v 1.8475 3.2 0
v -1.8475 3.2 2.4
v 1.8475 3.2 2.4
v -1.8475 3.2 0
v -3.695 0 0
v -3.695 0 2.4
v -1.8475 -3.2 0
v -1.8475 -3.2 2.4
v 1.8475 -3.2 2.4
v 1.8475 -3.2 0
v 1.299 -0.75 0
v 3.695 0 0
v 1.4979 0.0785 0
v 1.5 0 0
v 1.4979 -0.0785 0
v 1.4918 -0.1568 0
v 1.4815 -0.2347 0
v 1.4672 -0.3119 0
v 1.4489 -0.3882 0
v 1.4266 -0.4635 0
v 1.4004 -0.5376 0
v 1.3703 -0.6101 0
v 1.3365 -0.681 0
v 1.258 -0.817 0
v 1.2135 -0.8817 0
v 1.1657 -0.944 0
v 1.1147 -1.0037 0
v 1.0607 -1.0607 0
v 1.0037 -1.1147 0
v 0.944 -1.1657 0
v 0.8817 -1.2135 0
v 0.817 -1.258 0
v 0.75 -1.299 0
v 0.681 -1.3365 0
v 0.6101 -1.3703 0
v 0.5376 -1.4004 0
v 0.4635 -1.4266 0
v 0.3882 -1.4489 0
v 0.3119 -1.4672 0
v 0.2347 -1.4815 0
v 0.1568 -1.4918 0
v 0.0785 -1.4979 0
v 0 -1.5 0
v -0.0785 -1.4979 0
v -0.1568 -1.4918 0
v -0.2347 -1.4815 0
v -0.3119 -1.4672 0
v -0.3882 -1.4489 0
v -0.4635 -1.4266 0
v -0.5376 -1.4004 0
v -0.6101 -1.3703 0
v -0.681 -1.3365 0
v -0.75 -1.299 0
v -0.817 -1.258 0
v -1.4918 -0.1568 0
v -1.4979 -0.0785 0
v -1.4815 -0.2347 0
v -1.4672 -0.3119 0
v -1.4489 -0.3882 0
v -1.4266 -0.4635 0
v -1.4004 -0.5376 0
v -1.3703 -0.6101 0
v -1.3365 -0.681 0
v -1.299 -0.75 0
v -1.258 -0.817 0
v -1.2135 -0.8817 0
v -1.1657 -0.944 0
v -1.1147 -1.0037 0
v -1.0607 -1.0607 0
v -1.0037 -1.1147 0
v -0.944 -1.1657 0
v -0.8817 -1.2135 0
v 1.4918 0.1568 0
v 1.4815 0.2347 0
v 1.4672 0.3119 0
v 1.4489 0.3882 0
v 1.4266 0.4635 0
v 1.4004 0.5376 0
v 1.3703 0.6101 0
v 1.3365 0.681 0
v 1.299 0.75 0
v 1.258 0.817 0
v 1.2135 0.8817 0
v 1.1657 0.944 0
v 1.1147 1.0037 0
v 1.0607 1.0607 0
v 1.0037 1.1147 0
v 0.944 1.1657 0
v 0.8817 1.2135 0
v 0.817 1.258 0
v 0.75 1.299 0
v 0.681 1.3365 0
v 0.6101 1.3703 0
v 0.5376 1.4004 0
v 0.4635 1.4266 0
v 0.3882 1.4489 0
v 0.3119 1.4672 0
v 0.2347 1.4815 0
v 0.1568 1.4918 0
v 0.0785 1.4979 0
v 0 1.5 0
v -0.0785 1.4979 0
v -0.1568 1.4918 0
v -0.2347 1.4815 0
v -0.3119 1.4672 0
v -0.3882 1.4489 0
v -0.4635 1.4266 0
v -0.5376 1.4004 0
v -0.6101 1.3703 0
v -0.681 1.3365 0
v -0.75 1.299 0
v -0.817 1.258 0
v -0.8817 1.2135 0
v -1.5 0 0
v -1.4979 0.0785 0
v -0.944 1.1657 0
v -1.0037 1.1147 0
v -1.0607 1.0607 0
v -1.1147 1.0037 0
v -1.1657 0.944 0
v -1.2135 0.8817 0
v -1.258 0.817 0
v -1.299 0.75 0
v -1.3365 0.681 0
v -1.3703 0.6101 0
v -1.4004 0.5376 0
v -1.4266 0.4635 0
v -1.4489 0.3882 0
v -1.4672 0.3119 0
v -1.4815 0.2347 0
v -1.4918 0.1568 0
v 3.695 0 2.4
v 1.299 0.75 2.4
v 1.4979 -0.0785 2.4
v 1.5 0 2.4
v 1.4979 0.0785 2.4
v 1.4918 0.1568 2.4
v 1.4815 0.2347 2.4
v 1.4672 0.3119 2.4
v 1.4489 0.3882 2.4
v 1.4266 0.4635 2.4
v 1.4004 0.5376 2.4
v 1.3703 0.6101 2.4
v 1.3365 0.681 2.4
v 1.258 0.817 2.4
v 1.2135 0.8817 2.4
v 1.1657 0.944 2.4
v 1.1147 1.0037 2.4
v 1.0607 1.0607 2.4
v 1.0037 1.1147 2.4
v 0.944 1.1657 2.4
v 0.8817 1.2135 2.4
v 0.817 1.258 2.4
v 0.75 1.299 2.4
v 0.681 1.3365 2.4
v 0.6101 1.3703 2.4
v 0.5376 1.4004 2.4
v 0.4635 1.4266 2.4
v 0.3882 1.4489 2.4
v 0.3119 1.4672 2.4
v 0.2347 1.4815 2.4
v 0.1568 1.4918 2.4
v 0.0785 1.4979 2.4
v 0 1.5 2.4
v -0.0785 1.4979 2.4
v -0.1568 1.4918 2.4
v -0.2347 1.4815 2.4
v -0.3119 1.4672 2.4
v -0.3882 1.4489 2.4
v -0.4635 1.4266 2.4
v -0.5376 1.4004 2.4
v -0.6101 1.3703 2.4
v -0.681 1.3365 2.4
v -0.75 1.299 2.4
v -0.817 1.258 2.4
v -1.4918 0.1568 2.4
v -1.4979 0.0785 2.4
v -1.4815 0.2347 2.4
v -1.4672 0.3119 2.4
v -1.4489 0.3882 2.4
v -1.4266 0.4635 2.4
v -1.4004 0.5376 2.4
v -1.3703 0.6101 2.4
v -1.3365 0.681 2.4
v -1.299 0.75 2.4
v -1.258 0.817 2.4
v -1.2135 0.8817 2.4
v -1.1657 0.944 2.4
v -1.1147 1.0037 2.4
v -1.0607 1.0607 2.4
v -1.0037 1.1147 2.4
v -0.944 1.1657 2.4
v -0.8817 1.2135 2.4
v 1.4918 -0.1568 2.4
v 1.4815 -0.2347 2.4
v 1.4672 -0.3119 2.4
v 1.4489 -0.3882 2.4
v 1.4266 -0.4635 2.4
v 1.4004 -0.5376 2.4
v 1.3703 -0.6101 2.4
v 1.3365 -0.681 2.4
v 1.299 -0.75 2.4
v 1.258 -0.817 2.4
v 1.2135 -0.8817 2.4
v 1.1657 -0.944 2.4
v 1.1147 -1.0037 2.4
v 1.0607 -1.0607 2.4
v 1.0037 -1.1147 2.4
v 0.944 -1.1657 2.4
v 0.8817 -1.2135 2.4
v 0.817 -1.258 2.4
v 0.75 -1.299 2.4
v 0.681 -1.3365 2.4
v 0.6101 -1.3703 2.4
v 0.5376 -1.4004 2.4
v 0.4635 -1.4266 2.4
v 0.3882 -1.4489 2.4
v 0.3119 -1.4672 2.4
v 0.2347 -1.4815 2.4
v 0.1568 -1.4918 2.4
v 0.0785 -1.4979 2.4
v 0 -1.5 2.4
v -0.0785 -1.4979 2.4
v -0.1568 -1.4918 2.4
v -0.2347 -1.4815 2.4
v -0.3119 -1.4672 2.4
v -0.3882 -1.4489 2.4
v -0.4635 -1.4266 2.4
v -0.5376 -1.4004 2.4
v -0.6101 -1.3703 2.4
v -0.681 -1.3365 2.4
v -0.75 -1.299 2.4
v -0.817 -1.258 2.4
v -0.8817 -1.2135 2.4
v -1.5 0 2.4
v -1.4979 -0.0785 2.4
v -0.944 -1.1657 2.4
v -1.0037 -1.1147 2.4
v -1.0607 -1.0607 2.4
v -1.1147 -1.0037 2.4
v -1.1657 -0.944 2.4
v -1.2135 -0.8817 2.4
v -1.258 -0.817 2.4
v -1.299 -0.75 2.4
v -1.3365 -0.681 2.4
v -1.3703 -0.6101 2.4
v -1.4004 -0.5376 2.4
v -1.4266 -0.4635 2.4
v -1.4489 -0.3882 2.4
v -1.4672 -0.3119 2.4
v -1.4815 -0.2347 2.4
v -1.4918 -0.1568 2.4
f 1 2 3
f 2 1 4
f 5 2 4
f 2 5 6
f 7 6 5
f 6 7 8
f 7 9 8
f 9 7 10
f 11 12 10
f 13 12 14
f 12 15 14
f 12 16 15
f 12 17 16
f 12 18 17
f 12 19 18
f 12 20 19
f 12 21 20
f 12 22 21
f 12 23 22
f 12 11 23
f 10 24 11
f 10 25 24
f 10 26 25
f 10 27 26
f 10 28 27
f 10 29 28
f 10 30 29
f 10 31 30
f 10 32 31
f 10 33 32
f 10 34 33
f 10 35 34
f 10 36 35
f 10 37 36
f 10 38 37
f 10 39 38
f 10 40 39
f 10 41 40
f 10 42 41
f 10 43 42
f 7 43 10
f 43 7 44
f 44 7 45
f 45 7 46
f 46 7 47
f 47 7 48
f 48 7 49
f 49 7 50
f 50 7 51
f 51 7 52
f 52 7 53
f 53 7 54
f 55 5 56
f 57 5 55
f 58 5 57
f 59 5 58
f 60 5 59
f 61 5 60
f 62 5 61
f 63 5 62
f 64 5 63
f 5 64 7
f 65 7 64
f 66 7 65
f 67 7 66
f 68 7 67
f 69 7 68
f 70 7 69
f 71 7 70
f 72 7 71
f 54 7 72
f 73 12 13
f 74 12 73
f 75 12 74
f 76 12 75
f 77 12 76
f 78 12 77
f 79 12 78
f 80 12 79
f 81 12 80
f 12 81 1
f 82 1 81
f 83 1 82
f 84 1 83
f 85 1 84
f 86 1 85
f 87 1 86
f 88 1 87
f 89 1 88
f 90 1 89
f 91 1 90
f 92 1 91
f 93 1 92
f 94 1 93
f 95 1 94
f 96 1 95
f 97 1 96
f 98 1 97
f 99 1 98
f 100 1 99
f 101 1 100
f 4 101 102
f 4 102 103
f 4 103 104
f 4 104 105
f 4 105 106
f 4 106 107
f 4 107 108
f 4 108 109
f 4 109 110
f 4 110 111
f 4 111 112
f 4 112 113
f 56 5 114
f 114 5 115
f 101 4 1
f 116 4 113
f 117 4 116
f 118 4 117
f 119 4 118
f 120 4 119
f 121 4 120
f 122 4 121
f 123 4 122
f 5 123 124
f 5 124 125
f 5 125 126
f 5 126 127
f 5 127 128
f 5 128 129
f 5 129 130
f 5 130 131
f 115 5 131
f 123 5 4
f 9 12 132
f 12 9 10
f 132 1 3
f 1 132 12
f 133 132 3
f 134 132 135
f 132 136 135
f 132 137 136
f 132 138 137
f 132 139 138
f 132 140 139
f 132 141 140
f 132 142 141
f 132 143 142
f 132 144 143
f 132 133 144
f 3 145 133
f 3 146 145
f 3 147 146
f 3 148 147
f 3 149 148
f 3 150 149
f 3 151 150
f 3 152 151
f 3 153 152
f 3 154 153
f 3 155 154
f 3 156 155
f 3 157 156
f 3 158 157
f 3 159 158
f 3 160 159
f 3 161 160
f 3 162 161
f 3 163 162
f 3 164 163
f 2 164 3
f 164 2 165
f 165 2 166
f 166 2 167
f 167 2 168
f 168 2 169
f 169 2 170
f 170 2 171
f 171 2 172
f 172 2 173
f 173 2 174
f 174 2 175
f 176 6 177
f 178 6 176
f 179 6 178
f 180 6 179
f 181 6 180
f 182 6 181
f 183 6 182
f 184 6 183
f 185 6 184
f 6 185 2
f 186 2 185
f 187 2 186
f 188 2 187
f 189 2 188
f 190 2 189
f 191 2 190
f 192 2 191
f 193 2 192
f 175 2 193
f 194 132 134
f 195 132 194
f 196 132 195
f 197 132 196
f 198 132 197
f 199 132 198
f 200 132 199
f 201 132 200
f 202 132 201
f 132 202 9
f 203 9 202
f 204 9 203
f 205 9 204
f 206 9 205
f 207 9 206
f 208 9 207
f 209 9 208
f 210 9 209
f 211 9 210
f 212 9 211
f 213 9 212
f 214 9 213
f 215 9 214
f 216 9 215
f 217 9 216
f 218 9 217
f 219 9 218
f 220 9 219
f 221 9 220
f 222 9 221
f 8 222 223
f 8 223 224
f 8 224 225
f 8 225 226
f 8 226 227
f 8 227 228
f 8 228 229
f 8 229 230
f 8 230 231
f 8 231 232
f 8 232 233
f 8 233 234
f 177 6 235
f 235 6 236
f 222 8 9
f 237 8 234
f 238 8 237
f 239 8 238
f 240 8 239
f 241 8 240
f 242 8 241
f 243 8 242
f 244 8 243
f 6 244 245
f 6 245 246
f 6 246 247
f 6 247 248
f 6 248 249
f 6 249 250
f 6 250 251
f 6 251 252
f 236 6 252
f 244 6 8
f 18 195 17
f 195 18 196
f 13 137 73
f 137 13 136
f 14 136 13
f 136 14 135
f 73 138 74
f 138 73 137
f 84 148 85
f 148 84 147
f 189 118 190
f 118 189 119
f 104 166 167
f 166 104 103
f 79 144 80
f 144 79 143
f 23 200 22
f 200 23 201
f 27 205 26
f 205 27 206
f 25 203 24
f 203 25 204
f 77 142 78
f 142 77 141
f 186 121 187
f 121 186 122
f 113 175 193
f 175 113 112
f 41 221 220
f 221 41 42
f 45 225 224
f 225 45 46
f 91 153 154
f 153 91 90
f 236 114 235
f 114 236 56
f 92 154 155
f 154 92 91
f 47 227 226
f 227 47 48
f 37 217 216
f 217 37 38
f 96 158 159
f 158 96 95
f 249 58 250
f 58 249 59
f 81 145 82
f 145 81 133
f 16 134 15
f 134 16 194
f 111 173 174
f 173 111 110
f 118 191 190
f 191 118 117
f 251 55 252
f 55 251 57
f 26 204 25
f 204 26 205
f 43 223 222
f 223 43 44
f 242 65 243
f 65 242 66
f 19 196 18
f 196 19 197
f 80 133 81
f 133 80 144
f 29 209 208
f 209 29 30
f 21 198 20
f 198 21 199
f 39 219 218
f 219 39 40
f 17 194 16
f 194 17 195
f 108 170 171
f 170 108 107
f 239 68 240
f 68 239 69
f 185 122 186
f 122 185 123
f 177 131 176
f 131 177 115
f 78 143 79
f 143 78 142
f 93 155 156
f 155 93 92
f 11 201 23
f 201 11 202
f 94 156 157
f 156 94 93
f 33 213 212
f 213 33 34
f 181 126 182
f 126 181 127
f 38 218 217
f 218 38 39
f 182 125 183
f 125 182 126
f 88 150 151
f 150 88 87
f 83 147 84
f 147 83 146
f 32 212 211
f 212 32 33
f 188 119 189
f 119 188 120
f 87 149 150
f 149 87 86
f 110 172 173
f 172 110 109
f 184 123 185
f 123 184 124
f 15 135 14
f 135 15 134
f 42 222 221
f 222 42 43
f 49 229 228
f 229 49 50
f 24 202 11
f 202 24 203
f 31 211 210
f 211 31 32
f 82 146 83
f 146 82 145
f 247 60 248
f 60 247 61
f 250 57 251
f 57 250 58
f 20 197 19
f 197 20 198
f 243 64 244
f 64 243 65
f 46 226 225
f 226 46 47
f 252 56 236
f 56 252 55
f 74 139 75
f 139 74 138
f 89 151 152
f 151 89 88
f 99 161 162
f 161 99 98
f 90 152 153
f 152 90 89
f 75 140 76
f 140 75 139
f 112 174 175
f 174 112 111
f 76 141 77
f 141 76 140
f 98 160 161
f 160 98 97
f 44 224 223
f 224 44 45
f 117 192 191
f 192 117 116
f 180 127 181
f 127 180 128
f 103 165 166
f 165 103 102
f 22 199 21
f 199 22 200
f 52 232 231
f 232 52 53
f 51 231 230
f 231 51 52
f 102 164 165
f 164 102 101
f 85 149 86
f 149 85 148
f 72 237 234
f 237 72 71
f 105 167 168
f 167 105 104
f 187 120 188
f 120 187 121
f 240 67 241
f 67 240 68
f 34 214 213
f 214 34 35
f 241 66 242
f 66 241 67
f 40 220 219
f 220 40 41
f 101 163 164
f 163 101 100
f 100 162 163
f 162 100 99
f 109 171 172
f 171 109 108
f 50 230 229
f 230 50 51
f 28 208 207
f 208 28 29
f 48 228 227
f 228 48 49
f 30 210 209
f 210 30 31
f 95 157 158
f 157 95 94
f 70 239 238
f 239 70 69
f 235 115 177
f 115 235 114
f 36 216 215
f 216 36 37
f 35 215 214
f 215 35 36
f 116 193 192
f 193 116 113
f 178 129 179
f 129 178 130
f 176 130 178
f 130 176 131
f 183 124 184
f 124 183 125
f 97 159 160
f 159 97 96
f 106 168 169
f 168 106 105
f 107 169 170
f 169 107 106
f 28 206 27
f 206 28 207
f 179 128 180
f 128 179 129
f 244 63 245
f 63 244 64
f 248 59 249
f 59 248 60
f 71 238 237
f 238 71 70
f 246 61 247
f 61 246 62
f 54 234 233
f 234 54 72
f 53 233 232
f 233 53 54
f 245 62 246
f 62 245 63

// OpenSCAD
$fn = 120;

across_flats = 6.4;   // mm
thickness    = 2.4;   // mm
hole_d       = 3.0;   // mm (clearance as specified)

module hex_prism_af(af, h) {
    // For a regular hexagon: across_flats = 2 * apothem
    // Circumradius R = apothem / cos(30°) = (af/2) / cos(30°)
    R = (af/2) / cos(30);
    linear_extrude(height = h)
        polygon(points = [for (i = [0:5]) [R*cos(60*i), R*sin(60*i)]]);
}

difference() {
    hex_prism_af(across_flats, thickness);
    translate([0,0,-0.2])
        cylinder(d = hole_d, h = thickness + 0.4);
}
